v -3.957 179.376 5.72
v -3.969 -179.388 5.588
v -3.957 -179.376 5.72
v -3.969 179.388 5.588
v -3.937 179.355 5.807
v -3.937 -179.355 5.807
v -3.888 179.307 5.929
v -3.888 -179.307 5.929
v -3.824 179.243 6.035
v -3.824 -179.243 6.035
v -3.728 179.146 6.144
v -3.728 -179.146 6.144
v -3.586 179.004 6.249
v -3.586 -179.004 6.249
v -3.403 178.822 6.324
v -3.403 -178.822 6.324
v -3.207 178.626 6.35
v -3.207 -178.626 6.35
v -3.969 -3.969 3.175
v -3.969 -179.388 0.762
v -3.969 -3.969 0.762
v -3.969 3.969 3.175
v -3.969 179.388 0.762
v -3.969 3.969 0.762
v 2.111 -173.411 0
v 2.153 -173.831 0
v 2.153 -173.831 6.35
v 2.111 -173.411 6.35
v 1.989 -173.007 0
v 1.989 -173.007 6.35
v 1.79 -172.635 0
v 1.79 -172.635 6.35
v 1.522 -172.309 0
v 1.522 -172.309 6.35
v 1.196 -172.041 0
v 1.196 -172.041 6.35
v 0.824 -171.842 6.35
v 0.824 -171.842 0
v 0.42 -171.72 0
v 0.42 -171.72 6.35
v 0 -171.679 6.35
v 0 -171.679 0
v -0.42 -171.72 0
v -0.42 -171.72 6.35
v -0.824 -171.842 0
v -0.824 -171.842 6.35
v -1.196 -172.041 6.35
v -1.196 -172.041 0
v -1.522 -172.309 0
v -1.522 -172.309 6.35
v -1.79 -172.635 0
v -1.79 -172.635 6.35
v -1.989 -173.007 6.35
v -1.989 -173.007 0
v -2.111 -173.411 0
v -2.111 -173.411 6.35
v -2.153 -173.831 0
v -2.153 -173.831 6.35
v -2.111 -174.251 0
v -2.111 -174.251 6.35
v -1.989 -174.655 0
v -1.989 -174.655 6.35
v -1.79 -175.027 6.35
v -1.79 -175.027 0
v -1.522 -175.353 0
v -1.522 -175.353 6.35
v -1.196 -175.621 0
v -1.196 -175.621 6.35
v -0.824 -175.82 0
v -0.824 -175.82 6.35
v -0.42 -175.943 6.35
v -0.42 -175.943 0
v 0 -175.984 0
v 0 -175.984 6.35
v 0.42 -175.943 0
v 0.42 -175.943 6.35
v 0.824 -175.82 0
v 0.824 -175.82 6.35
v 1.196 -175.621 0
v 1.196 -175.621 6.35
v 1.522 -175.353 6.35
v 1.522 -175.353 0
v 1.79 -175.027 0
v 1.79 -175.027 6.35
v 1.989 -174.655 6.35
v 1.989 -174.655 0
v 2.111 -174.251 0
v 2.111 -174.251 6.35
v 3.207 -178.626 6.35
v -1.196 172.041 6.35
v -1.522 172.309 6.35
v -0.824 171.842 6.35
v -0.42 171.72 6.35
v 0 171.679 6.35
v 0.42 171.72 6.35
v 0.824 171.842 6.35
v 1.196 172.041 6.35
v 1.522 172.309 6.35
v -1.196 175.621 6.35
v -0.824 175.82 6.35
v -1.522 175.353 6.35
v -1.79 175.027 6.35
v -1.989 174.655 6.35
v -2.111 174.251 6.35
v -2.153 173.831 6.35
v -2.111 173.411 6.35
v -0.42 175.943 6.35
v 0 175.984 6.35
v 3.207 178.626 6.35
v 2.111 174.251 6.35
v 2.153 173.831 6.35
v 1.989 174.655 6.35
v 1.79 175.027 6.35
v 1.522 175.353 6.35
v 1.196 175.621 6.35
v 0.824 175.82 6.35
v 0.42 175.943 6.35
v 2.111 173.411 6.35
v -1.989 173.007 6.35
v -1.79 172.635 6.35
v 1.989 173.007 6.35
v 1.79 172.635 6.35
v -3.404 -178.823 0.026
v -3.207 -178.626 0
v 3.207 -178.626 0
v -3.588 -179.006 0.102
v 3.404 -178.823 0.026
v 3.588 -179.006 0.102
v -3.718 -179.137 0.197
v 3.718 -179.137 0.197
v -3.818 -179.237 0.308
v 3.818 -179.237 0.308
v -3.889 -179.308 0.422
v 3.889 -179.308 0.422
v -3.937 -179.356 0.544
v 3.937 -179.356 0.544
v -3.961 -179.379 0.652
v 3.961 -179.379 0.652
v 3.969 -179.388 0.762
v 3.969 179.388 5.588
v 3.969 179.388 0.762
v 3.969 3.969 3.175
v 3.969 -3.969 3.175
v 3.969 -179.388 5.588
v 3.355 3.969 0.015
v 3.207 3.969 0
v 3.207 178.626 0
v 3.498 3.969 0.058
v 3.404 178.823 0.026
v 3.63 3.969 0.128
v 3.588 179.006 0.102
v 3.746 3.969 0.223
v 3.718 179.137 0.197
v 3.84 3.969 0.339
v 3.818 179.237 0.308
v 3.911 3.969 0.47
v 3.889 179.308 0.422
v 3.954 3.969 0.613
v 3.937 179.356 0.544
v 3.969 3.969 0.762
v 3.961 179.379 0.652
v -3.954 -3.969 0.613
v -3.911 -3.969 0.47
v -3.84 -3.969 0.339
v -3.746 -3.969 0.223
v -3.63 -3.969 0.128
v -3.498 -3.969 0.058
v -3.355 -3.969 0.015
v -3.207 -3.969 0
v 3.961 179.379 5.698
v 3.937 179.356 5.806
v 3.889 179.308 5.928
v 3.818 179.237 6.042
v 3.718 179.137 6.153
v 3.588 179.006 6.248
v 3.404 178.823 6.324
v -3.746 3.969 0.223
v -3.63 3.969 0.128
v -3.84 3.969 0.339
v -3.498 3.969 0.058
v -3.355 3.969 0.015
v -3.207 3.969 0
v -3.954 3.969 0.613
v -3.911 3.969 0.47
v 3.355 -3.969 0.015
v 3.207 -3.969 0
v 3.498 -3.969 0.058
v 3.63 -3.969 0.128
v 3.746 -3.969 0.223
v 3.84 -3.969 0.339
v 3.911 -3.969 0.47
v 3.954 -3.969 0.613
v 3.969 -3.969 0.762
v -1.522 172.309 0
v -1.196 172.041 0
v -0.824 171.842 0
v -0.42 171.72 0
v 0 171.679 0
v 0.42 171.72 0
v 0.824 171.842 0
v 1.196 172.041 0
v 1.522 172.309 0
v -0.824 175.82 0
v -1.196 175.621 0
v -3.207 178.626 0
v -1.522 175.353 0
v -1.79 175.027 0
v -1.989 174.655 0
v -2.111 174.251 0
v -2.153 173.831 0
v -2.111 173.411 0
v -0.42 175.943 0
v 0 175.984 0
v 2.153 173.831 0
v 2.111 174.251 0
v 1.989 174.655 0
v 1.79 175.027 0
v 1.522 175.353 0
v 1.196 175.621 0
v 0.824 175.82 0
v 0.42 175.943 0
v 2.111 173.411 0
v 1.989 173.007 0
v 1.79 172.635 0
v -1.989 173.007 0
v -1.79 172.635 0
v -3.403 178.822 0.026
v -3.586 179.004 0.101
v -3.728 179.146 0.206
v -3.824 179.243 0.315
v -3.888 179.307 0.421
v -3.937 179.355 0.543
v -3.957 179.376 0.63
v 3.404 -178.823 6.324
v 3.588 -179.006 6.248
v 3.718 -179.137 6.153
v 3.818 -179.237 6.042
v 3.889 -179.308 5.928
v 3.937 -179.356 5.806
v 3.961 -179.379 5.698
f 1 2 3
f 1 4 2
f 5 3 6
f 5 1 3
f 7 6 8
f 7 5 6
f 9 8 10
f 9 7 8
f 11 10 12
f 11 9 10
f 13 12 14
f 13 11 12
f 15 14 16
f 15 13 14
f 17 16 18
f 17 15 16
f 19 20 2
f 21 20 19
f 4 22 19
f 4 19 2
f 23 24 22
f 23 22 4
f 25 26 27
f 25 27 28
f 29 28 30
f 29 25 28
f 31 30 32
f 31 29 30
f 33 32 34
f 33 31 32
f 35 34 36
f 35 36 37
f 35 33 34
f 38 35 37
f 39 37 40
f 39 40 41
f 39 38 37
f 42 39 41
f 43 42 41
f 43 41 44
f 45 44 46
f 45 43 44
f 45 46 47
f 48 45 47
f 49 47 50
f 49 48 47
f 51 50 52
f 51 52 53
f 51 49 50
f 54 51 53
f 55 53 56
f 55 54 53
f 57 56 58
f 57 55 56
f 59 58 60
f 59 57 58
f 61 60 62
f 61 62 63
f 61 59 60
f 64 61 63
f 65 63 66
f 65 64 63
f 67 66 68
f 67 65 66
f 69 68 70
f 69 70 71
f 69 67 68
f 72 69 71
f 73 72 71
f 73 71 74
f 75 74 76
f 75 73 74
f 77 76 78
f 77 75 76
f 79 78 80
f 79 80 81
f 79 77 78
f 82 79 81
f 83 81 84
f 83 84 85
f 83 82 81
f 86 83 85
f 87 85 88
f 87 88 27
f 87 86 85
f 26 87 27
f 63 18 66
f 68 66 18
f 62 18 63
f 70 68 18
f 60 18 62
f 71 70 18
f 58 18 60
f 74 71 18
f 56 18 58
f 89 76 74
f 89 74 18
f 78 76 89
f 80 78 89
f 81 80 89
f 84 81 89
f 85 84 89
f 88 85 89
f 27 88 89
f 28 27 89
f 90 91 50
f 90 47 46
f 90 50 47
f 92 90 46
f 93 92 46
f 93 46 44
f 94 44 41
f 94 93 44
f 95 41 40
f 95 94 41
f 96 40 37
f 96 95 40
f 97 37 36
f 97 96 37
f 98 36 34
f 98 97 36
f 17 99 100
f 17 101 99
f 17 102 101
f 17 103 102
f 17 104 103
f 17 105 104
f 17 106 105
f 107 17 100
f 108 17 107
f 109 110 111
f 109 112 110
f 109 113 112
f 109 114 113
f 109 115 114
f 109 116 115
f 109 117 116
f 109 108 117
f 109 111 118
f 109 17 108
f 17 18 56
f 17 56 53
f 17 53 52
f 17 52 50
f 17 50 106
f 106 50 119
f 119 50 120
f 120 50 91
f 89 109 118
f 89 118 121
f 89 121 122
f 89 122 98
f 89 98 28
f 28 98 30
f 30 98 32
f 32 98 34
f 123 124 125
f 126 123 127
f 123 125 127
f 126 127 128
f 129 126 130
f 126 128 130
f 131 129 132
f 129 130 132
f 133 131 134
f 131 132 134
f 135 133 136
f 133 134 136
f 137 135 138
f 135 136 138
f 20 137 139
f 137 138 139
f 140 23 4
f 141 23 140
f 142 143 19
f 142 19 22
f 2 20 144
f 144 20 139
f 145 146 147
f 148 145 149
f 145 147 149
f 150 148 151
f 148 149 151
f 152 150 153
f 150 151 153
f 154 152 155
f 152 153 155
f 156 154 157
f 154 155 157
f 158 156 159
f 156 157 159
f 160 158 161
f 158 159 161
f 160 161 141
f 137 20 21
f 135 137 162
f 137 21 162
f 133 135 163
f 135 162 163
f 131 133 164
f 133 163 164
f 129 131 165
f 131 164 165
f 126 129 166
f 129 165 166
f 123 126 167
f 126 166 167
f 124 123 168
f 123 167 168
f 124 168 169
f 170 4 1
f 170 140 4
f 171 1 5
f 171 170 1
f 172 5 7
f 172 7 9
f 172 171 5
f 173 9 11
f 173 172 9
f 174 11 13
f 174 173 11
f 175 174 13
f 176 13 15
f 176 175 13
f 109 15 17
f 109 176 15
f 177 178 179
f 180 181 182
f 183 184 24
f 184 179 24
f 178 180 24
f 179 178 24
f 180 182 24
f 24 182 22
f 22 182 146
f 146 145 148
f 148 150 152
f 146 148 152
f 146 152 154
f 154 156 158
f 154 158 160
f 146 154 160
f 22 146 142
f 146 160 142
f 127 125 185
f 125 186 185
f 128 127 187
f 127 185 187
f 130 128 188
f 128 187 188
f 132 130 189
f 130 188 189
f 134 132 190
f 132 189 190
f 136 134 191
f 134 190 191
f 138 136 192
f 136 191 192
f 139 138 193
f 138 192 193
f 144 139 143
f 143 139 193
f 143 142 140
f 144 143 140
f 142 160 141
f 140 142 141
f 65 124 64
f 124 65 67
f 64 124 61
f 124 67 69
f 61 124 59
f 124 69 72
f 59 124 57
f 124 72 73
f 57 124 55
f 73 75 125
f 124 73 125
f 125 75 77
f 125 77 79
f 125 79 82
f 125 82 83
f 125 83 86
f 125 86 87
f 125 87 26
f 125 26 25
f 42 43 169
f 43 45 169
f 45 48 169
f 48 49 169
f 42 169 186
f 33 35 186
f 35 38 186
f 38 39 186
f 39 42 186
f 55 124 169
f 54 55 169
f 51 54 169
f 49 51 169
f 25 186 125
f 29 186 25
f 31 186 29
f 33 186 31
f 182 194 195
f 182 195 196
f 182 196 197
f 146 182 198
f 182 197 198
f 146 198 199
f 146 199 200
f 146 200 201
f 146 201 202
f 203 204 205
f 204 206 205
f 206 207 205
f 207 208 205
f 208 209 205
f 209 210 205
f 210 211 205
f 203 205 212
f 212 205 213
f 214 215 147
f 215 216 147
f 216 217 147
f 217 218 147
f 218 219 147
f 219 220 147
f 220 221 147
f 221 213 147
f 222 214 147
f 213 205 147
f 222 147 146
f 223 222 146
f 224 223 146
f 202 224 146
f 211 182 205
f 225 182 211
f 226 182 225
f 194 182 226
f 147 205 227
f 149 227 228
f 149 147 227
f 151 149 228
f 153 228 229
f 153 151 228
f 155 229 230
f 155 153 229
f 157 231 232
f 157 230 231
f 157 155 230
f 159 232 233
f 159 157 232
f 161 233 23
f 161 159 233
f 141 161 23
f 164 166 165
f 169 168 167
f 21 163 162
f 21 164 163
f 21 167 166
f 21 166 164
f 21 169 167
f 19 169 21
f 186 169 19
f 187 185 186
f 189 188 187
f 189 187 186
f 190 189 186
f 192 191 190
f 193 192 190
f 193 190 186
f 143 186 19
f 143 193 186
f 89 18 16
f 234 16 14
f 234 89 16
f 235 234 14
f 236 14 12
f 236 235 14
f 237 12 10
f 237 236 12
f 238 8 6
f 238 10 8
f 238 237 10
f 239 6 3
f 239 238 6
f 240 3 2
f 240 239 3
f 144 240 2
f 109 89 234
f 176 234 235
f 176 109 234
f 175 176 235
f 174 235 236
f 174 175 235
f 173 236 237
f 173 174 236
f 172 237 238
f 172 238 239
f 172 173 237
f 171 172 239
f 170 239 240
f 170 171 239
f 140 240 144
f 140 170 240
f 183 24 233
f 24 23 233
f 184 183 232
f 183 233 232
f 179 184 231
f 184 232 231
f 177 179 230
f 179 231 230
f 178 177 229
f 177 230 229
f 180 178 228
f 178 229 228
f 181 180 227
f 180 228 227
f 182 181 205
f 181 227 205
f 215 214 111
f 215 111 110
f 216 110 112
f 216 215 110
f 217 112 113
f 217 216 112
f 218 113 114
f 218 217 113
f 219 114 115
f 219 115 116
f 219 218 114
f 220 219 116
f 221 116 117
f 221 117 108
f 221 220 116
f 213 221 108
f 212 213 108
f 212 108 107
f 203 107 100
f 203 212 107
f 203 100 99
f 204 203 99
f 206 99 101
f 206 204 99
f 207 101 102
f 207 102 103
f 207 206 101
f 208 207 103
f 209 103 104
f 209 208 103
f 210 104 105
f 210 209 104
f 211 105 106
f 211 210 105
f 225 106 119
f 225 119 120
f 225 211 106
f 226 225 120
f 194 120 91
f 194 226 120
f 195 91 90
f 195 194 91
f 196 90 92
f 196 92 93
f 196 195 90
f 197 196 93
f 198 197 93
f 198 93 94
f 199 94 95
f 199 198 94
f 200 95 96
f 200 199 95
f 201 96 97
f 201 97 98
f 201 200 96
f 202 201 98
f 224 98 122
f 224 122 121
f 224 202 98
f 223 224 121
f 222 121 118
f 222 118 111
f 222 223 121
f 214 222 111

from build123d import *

# Parameters (mm, degrees)
F0_W     = 7.9375
F0_H     = 358.775
F0_R     = 2.15265
F1_DEPTH = 6.35
F2_W     = 7.9375
F2_H     = 3.175
F3_DEPTH = 7.9375
F4_R     = 0.762


with BuildPart() as f1:
    # F0 (on Top) → F1 (new body)
    with BuildSketch(Plane.XY):
        Rectangle(F0_W, F0_H)
        with Locations((0, -173.83125)):
            Circle(F0_R, mode=Mode.SUBTRACT)
        with Locations((0, 173.83125)):
            Circle(F0_R, mode=Mode.SUBTRACT)
    extrude(amount=F1_DEPTH)

    # F2 (on face) → F3 (cut, through all)
    with BuildSketch(Plane.YZ.offset(3.96875)):
        with Locations((0, 1.5875)):
            Rectangle(F2_W, F2_H)
    extrude(amount=-F3_DEPTH, mode=Mode.SUBTRACT)

    # F4
    f4_edges = [f1.edges().sort_by_distance(p)[0] for p in [
        (0, -179.3875, 0),
        (3.96875, -91.678125, 0),
        (3.96875, 91.678125, 0),
        (-3.96875, 91.678125, 0),
        (-3.96875, -91.678125, 0),
        (0, 179.3875, 0),
        (-3.96875, 0, 6.35),
        (0, -179.3875, 6.35),
        (3.96875, 0, 6.35),
        (0, 179.3875, 6.35),
    ]]
    fillet(f4_edges, radius=F4_R)


solid = f1.part
